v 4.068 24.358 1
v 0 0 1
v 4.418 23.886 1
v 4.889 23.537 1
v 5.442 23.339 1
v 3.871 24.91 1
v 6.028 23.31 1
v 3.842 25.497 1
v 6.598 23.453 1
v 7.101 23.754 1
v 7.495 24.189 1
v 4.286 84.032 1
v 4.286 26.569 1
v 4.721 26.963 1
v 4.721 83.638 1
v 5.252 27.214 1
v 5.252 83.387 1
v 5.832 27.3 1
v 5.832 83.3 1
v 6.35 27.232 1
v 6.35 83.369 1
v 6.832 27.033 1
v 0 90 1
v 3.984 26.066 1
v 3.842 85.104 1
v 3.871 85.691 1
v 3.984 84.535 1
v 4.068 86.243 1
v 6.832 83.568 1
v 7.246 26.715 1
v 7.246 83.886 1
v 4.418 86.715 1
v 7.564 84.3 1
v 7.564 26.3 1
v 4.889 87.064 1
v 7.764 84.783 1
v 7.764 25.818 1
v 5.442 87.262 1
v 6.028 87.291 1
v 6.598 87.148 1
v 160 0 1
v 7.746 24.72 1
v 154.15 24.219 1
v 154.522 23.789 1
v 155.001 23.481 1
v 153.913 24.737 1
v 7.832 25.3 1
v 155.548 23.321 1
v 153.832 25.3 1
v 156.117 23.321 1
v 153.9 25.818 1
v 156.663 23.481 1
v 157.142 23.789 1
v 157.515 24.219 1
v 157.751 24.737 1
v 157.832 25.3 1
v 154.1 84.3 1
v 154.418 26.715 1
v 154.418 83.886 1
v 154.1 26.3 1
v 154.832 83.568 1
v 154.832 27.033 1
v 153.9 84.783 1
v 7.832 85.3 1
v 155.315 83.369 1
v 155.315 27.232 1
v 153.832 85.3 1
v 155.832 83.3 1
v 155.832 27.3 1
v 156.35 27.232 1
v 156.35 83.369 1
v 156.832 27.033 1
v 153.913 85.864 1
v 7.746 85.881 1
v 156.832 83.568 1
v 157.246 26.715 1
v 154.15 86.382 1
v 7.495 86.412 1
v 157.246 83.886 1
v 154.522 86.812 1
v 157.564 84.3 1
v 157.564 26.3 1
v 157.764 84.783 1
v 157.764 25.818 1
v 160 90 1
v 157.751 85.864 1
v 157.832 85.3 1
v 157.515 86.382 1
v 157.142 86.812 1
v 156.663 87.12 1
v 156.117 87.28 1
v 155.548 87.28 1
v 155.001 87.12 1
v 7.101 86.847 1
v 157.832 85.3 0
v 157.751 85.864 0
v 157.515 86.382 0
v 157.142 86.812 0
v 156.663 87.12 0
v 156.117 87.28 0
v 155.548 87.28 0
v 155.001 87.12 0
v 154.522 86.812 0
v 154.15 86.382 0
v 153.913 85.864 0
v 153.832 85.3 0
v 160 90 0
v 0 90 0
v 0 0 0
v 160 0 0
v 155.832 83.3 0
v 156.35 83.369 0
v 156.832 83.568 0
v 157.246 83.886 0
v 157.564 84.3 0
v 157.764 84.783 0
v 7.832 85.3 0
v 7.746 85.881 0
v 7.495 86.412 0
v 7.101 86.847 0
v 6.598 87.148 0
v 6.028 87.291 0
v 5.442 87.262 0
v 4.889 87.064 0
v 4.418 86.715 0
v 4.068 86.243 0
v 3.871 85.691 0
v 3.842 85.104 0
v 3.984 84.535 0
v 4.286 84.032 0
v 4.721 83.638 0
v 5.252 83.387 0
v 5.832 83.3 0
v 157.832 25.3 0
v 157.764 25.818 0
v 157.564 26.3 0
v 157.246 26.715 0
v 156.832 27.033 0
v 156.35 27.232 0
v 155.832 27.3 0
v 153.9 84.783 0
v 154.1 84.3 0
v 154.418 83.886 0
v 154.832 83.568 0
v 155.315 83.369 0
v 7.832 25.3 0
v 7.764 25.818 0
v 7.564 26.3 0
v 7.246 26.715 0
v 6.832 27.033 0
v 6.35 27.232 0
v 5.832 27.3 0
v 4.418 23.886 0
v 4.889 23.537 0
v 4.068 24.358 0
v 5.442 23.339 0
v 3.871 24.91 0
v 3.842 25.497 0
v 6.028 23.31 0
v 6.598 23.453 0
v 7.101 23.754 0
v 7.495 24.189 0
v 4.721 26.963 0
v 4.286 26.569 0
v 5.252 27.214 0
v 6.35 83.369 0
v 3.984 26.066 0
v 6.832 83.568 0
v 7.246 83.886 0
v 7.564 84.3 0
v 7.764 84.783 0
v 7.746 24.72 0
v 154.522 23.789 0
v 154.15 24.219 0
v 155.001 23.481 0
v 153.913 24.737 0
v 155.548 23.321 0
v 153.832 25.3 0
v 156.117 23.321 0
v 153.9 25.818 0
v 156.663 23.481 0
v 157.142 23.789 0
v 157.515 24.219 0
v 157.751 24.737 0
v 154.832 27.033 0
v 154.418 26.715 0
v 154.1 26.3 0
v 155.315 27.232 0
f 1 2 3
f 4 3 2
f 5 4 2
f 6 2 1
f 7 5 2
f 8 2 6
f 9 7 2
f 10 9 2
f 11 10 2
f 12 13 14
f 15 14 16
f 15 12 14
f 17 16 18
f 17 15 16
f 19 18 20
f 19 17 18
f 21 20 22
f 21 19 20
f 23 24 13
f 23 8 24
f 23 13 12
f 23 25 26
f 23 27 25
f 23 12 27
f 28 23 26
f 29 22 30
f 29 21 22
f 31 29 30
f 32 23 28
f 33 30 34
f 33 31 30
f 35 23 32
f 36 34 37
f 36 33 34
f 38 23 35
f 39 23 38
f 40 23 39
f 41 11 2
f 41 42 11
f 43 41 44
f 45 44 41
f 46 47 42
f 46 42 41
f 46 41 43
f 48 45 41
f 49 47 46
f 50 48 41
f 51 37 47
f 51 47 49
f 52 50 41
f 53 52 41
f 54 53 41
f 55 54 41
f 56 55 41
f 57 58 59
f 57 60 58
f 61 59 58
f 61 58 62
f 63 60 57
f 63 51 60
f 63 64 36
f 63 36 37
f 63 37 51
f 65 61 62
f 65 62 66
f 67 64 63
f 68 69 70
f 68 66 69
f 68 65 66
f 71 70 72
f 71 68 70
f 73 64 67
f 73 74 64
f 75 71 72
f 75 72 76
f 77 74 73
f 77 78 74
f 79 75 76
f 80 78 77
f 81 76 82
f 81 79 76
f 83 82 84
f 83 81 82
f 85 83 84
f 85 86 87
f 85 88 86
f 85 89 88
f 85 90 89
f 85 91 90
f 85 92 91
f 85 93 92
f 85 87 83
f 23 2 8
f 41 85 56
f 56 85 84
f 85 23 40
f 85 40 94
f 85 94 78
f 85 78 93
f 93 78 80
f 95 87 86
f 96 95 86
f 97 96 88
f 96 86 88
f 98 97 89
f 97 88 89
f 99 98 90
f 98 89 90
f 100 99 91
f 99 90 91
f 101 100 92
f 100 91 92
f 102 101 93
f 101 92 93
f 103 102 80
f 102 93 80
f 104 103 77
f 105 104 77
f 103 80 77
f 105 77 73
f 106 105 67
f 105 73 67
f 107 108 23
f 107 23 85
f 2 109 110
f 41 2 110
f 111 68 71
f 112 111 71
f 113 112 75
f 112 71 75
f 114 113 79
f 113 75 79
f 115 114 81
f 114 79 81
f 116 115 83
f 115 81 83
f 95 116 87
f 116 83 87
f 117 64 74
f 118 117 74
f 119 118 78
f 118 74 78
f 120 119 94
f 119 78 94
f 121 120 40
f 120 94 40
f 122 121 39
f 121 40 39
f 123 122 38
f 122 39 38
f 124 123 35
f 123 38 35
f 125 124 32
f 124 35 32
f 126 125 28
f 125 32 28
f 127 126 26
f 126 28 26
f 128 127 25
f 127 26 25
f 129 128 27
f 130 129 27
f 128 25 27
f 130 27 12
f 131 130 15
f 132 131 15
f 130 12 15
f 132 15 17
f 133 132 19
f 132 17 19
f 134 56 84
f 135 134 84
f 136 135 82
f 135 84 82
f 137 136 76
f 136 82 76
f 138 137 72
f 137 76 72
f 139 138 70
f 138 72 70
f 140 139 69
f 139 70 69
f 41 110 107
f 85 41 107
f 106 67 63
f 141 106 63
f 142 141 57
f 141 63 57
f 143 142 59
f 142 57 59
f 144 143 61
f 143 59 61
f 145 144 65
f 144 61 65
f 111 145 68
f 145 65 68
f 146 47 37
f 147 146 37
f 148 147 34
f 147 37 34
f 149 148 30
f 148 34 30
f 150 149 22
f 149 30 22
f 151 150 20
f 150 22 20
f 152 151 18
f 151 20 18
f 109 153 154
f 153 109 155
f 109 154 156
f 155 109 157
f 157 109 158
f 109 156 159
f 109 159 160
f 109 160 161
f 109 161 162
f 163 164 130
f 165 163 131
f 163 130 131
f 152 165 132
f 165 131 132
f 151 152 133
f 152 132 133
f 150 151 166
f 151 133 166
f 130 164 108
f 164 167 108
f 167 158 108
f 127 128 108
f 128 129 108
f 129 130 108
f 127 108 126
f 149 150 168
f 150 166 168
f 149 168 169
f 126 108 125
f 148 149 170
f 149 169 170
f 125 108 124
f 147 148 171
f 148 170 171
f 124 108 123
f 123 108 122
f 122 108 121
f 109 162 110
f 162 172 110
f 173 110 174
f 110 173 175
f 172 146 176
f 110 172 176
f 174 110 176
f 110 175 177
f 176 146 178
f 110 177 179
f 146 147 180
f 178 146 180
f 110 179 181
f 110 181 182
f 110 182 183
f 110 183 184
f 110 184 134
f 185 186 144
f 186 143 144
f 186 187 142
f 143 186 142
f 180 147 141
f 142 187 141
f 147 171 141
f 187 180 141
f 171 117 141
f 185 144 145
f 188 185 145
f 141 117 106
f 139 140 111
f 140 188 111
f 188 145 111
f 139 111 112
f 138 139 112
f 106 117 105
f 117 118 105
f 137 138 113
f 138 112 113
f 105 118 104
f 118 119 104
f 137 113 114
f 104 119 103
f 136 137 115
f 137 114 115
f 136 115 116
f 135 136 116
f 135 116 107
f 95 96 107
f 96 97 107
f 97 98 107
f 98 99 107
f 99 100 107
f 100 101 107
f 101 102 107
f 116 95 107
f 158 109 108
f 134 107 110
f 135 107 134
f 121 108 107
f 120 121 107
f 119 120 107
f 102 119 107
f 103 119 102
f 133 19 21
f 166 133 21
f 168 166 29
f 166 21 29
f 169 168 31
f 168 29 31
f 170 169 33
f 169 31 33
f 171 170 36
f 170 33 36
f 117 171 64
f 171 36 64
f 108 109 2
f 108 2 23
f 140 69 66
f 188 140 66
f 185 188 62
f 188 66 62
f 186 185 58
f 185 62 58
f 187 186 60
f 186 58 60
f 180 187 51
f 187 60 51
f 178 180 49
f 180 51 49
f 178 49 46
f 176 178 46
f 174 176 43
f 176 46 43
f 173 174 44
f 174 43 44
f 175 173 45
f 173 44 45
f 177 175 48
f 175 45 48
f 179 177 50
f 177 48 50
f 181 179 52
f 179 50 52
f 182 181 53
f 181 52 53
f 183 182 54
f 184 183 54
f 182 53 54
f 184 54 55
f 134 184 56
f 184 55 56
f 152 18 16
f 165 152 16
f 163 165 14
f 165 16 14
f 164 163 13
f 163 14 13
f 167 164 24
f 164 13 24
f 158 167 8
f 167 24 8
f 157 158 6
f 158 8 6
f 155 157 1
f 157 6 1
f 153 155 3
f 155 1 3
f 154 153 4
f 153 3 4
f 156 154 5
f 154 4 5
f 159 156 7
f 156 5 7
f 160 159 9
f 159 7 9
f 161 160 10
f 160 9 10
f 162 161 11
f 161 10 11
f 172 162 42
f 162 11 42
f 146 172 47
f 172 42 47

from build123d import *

# Parameters (mm, degrees)
SCHIZZO1_W                   = 160
SCHIZZO1_H                   = 90
ESTRUSIONE_ESTRUSIONE1_DEPTH = 1
TAGLIO_ESTRUSIONE1_DEPTH     = 10


with BuildPart() as part:
    # Schizzo1 → Estrusione-Estrusione1 (new body)
    with BuildSketch(Plane.XY):
        with Locations((80, 45)):
            Rectangle(SCHIZZO1_W, SCHIZZO1_H)
    extrude(amount=ESTRUSIONE_ESTRUSIONE1_DEPTH)

    # Schizzo3 → Taglio-Estrusione1 (cut)
    with BuildSketch(Plane.XY.offset(1)):
        with BuildLine():
            Line((5.83216523, 83.300482418), (5.83216523, 85.300482418))
            Line((5.83216523, 85.300482418), (7.83216523, 85.300482418))
            ThreePointArc((7.83216523, 85.300482418), (4.417951668, 86.714695981), (5.83216523, 83.300482418))
        make_face()
        with BuildLine():
            Line((7.83216523, 85.300482418), (5.83216523, 85.300482418))
            Line((5.83216523, 85.300482418), (5.83216523, 83.300482418))
            ThreePointArc((5.83216523, 83.300482418), (7.246378792, 83.886268856), (7.83216523, 85.300482418))
        make_face()
        with BuildLine():
            ThreePointArc((157.83216523, 85.300482418), (155.83216523, 87.300482418), (153.83216523, 85.300482418))
            Line((153.83216523, 85.300482418), (155.83216523, 85.300482418))
            Line((155.83216523, 85.300482418), (155.83216523, 83.300482418))
            ThreePointArc((155.83216523, 83.300482418), (157.246378792, 83.886268856), (157.83216523, 85.300482418))
        make_face()
        with BuildLine():
            Line((155.83216523, 85.300482418), (153.83216523, 85.300482418))
            ThreePointArc((153.83216523, 85.300482418), (154.417951668, 83.886268856), (155.83216523, 83.300482418))
            Line((155.83216523, 83.300482418), (155.83216523, 85.300482418))
        make_face()
        with BuildLine():
            ThreePointArc((157.83216523, 25.300482418), (157.246378792, 26.714695981), (155.83216523, 27.300482418))
            Line((155.83216523, 27.300482418), (155.83216523, 25.300482418))
            Line((155.83216523, 25.300482418), (153.83216523, 25.300482418))
            ThreePointArc((153.83216523, 25.300482418), (155.83216523, 23.300482418), (157.83216523, 25.300482418))
        make_face()
        with BuildLine():
            Line((155.83216523, 25.300482418), (155.83216523, 27.300482418))
            ThreePointArc((155.83216523, 27.300482418), (154.417951668, 26.714695981), (153.83216523, 25.300482418))
            Line((153.83216523, 25.300482418), (155.83216523, 25.300482418))
        make_face()
        with BuildLine():
            ThreePointArc((7.83216523, 25.300482418), (7.246378792, 26.714695981), (5.83216523, 27.300482418))
            Line((5.83216523, 27.300482418), (5.83216523, 25.300482418))
            Line((5.83216523, 25.300482418), (7.83216523, 25.300482418))
        make_face()
        with BuildLine():
            Line((5.83216523, 25.300482418), (5.83216523, 27.300482418))
            ThreePointArc((5.83216523, 27.300482418), (4.417951668, 23.886268856), (7.83216523, 25.300482418))
            Line((7.83216523, 25.300482418), (5.83216523, 25.300482418))
        make_face()
    extrude(amount=-TAGLIO_ESTRUSIONE1_DEPTH, mode=Mode.SUBTRACT)


solid = part.part
